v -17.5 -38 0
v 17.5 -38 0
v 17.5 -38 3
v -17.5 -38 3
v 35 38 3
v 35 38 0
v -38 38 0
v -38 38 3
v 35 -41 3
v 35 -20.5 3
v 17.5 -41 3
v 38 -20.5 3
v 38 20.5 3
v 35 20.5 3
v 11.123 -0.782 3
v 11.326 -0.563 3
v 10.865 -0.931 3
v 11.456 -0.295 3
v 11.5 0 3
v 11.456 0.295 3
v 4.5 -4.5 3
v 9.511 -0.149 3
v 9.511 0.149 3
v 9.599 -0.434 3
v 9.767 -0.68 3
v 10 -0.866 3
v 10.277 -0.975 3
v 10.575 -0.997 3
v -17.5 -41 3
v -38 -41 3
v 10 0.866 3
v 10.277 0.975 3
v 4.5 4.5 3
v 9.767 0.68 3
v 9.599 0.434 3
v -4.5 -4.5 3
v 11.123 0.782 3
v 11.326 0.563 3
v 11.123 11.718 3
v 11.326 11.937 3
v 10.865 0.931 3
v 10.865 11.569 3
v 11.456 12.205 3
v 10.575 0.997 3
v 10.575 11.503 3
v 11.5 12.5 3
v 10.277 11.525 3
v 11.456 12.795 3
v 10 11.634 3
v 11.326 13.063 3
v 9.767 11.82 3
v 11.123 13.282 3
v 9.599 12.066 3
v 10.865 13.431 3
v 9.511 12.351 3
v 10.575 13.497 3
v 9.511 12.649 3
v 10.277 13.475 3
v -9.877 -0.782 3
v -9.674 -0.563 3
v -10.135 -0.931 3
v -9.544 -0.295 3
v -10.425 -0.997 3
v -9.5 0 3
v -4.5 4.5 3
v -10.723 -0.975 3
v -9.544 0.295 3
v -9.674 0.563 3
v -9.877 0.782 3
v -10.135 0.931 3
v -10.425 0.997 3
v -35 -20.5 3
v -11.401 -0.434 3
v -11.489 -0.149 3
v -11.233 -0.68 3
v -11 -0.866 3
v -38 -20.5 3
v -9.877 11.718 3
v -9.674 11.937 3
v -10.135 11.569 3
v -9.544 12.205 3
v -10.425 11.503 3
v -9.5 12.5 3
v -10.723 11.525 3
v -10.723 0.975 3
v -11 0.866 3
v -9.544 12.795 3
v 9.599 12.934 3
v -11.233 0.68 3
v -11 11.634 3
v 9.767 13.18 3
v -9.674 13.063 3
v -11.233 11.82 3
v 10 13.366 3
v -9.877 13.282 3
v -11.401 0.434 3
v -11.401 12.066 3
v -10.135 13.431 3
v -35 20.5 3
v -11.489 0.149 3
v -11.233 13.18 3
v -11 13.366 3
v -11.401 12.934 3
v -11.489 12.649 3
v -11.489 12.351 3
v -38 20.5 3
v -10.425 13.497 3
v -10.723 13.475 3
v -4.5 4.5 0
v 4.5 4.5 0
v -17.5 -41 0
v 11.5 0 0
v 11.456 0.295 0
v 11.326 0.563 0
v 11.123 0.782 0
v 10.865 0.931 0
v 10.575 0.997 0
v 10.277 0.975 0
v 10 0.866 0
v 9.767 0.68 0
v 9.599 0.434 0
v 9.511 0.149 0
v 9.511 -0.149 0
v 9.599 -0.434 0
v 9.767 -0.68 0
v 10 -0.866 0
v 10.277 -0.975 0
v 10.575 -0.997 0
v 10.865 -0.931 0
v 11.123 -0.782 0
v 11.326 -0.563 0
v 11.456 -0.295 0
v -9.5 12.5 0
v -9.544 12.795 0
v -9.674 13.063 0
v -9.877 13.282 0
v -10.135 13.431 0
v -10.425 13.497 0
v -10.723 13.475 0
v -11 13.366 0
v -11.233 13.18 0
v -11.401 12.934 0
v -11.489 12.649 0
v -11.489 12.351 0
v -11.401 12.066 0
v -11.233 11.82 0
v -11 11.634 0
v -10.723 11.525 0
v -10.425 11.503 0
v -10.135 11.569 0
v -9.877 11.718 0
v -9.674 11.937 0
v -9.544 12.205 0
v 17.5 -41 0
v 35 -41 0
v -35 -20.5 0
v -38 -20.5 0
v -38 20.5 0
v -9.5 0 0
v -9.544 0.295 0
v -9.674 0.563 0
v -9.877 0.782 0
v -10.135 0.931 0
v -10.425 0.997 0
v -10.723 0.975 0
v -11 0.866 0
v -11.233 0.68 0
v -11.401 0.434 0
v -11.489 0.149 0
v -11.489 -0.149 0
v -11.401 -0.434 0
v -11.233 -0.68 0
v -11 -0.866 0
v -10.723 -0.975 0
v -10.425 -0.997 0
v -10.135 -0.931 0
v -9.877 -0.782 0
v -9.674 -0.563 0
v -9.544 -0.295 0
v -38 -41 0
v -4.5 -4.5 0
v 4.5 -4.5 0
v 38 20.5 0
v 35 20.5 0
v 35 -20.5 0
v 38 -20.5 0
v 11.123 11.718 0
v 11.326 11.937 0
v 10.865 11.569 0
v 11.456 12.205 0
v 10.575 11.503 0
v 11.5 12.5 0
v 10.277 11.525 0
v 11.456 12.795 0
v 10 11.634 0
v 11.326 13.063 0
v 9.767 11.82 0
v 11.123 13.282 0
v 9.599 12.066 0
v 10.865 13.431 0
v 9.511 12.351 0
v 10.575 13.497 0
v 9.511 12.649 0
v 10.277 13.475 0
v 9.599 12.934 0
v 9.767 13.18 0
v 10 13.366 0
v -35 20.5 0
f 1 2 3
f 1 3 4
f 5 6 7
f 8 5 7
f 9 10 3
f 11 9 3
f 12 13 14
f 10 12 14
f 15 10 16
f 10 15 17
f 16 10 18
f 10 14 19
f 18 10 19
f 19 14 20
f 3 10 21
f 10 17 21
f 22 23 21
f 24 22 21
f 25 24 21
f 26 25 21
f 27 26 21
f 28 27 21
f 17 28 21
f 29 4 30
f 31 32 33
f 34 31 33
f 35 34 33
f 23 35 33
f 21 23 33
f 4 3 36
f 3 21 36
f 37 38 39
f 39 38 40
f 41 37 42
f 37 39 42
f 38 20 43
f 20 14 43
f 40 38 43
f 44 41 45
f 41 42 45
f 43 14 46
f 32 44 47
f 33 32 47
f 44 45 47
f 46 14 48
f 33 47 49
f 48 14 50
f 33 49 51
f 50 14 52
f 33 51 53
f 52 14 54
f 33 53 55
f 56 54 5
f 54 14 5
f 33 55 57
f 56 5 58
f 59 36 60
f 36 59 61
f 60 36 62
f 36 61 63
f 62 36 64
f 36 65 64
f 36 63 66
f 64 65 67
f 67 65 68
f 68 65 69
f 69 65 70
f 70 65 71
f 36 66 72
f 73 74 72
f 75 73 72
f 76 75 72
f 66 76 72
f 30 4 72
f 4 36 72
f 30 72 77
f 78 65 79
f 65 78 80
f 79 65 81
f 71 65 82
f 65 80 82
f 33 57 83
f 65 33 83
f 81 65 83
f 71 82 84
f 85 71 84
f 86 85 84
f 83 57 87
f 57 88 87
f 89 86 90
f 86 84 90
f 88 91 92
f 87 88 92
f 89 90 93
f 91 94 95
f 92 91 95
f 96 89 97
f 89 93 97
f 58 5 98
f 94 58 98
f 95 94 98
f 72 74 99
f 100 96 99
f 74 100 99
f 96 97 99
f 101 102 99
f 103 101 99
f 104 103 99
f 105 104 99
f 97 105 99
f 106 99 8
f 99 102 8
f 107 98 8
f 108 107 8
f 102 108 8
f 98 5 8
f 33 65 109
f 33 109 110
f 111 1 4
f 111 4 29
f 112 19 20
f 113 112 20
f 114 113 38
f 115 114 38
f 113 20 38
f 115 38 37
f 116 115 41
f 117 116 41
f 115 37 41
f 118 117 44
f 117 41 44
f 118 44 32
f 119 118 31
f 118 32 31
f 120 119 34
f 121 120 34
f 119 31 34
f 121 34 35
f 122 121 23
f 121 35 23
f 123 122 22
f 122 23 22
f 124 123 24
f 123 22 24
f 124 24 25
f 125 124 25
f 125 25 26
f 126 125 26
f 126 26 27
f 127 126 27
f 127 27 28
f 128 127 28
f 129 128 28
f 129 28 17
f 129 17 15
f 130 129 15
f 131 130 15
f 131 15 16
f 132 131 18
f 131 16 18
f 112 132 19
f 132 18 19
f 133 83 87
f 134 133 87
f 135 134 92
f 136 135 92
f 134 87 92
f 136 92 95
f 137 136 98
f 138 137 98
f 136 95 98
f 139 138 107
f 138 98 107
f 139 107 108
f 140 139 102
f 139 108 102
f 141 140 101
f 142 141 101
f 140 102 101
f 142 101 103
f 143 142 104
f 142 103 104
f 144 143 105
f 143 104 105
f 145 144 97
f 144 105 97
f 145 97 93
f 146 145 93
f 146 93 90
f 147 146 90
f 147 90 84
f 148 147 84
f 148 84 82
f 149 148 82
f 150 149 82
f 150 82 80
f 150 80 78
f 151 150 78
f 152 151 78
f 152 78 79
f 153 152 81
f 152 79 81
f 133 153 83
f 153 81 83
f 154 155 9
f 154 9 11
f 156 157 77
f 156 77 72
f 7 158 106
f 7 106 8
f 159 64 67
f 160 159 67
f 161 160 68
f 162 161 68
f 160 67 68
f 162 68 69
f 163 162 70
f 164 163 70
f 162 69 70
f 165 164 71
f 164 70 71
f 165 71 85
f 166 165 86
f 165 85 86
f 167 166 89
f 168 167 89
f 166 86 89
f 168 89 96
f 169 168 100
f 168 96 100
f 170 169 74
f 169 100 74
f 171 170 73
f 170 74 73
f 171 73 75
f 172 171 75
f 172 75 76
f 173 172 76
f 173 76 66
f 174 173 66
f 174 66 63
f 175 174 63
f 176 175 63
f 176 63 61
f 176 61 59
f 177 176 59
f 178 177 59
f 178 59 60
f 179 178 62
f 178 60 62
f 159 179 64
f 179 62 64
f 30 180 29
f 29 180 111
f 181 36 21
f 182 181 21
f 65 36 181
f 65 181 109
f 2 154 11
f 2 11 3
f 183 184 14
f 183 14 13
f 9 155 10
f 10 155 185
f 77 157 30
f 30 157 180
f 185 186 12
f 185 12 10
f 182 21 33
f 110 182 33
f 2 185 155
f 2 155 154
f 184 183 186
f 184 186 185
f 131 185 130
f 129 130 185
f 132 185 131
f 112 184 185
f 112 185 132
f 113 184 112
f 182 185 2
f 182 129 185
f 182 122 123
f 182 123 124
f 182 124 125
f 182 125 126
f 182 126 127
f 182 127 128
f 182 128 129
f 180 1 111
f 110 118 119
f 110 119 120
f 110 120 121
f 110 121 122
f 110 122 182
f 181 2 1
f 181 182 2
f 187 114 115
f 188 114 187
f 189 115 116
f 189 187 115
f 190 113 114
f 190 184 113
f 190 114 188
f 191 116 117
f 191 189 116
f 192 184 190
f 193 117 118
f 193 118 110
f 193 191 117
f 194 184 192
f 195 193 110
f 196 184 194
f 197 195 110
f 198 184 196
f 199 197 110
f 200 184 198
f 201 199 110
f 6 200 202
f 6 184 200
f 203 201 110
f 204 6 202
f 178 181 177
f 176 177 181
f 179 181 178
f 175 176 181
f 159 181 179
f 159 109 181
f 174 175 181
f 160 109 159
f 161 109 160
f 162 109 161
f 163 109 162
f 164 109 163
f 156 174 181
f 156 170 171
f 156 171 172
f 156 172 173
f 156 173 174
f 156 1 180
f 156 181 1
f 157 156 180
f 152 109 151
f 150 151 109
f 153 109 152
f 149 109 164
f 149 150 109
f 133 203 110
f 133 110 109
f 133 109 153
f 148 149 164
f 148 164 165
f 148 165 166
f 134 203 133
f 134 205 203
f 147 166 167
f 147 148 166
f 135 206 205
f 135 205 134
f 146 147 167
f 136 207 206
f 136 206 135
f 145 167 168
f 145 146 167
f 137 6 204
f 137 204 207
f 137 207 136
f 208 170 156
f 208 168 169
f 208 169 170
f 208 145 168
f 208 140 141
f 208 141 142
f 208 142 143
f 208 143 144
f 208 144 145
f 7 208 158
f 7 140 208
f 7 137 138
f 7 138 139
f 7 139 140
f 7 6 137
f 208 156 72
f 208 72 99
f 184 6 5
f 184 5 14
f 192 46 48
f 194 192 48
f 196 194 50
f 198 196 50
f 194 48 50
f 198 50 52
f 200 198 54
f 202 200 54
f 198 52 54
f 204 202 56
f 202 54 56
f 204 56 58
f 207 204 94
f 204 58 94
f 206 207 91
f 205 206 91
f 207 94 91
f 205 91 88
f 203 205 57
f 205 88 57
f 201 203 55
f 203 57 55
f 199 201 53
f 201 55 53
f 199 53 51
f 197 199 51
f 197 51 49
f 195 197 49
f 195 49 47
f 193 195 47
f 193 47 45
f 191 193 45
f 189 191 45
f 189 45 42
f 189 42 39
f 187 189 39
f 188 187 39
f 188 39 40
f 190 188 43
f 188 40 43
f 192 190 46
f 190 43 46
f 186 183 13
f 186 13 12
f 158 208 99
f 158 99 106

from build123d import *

# Parameters (mm, degrees)
BOSS_EXTRUDE1_DEPTH = 3
SKETCH2_R           = 1
SKETCH2_W           = 9
SKETCH2_H           = 9
CUT_EXTRUDE1_DEPTH  = 3


with BuildPart() as part:
    # Sketch1 → Boss-Extrude1 (new body)
    with BuildSketch(Plane.XY):
        Polygon((-35, 38), (-17.5, 38), (17.5, 38), (35, 38), (35, 20.5), (38, 20.5), (38, -20.5), (35, -20.5), (35, -38), (35, -41), (17.5, -41), (17.5, -38), (-17.5, -38), (-17.5, -41), (-35, -41), (-38, -41), (-38, -38), (-38, -20.5), (-35, -20.5), (-35, 20.5), (-38, 20.5), (-38, 38), align=None)
    extrude(amount=BOSS_EXTRUDE1_DEPTH)

    # Sketch2 → Cut-Extrude1 (cut)
    with BuildSketch(Plane.XY.offset(3)):
        with Locations((-10.5, 12.5)):
            Circle(SKETCH2_R)
        with Locations((-10.5, 0)):
            Circle(SKETCH2_R)
        with Locations((10.5, 12.5)):
            Circle(SKETCH2_R)
        with Locations((10.5, 0)):
            Circle(SKETCH2_R)
        Rectangle(SKETCH2_W, SKETCH2_H)
    extrude(amount=-CUT_EXTRUDE1_DEPTH, mode=Mode.SUBTRACT)


solid = part.part
